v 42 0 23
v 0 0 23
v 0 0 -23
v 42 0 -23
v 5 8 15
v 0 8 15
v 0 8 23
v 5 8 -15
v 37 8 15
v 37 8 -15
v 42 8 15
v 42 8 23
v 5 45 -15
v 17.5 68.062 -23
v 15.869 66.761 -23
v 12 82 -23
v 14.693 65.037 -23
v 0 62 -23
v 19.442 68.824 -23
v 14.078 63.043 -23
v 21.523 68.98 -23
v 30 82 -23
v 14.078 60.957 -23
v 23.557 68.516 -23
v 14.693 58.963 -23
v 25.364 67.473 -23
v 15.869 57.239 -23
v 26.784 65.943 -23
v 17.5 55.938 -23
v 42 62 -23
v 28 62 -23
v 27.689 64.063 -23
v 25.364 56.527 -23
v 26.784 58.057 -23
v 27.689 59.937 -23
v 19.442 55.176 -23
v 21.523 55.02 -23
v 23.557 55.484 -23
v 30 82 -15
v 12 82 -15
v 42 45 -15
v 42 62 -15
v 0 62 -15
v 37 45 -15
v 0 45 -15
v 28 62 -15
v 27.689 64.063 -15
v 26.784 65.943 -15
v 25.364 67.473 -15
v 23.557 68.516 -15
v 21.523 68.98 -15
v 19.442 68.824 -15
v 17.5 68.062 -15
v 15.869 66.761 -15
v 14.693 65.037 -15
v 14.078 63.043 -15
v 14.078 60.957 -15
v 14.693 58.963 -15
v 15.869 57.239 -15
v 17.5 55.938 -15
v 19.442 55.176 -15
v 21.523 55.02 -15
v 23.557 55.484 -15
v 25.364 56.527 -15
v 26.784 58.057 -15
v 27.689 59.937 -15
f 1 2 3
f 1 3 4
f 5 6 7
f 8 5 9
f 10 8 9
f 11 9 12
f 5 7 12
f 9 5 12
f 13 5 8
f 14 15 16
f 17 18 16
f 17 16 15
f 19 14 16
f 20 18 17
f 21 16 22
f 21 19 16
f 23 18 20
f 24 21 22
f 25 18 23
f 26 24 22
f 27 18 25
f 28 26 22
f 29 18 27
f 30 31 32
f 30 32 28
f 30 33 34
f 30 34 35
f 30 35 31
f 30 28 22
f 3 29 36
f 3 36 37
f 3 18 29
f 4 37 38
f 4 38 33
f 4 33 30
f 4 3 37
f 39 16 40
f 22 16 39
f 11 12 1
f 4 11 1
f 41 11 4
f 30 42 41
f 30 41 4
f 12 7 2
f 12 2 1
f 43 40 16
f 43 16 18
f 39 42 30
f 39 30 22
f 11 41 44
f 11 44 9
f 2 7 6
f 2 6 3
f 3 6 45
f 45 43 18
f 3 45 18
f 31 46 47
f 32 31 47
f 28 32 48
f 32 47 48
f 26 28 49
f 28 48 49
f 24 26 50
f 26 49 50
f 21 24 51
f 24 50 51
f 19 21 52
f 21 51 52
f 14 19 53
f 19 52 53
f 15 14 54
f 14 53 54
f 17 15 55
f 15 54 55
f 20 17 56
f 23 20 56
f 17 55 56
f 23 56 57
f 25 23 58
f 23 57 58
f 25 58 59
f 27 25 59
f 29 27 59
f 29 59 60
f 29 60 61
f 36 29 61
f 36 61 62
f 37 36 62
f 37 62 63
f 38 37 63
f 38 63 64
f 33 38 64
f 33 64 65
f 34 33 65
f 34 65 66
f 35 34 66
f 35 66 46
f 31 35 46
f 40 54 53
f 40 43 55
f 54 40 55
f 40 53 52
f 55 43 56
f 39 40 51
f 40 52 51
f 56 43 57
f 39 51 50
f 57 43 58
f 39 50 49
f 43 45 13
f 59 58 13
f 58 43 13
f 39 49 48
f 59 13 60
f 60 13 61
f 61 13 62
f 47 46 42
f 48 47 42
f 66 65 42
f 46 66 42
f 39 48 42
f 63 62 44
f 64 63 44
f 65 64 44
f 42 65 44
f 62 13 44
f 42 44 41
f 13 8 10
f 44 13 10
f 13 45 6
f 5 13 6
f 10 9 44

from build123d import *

# Parameters (mm, degrees)
SKETCH2_W           = 42
SKETCH2_H           = 8
BOSS_EXTRUDE1_DEPTH = 23
SKETCH3_W           = 42
SKETCH3_H           = 8
BOSS_EXTRUDE2_DEPTH = 74
CUT_EXTRUDE1_DEPTH  = 100.659420026
BOSS_EXTRUDE3_DEPTH = 5
BOSS_EXTRUDE5_DEPTH = 5
SKETCH11_R          = 7
CUT_EXTRUDE2_DEPTH  = 100.659420026


with BuildPart() as part:
    # Sketch2 → Boss-Extrude1 (new, symmetric)
    with BuildSketch(Plane.XY):
        with Locations((21, 4)):
            Rectangle(SKETCH2_W, SKETCH2_H)
    extrude(amount=BOSS_EXTRUDE1_DEPTH, both=True)

    # Sketch3 → Boss-Extrude2 (add)
    with BuildSketch(Plane(origin=(0, 8, 0), x_dir=(1, 0, 0), z_dir=(0, 1, 0))):
        with Locations((21, 19)):
            Rectangle(SKETCH3_W, SKETCH3_H)
    extrude(amount=BOSS_EXTRUDE2_DEPTH)

    # Sketch4 → Cut-Extrude1 (cut, through all)
    with BuildSketch(Plane.XY.offset(-15)):
        Polygon((0, 82), (12, 82), (0, 62), align=None)
        Polygon((30, 82), (42, 82), (42, 62), align=None)
    extrude(amount=-CUT_EXTRUDE1_DEPTH, mode=Mode.SUBTRACT)

    # Sketch6 → Boss-Extrude3 (add)
    with BuildSketch(Plane(origin=(0, 0, 0), x_dir=(0, 0, -1), z_dir=(1, 0, 0))):
        Polygon((15, 45), (-15, 8), (15, 8), align=None)
    extrude(amount=BOSS_EXTRUDE3_DEPTH)

    # Sketch10 → Boss-Extrude5 (add)
    with BuildSketch(Plane(origin=(42, 0, 0), x_dir=(0, 0, -1), z_dir=(1, 0, 0))):
        Polygon((15, 45), (-15, 8), (15, 8), align=None)
    extrude(amount=-BOSS_EXTRUDE5_DEPTH)

    # Sketch11 → Cut-Extrude2 (cut, through all)
    with BuildSketch(Plane.XY.offset(-15)):
        with Locations((21, 62)):
            Circle(SKETCH11_R)
    extrude(amount=-CUT_EXTRUDE2_DEPTH, mode=Mode.SUBTRACT)


solid = part.part
